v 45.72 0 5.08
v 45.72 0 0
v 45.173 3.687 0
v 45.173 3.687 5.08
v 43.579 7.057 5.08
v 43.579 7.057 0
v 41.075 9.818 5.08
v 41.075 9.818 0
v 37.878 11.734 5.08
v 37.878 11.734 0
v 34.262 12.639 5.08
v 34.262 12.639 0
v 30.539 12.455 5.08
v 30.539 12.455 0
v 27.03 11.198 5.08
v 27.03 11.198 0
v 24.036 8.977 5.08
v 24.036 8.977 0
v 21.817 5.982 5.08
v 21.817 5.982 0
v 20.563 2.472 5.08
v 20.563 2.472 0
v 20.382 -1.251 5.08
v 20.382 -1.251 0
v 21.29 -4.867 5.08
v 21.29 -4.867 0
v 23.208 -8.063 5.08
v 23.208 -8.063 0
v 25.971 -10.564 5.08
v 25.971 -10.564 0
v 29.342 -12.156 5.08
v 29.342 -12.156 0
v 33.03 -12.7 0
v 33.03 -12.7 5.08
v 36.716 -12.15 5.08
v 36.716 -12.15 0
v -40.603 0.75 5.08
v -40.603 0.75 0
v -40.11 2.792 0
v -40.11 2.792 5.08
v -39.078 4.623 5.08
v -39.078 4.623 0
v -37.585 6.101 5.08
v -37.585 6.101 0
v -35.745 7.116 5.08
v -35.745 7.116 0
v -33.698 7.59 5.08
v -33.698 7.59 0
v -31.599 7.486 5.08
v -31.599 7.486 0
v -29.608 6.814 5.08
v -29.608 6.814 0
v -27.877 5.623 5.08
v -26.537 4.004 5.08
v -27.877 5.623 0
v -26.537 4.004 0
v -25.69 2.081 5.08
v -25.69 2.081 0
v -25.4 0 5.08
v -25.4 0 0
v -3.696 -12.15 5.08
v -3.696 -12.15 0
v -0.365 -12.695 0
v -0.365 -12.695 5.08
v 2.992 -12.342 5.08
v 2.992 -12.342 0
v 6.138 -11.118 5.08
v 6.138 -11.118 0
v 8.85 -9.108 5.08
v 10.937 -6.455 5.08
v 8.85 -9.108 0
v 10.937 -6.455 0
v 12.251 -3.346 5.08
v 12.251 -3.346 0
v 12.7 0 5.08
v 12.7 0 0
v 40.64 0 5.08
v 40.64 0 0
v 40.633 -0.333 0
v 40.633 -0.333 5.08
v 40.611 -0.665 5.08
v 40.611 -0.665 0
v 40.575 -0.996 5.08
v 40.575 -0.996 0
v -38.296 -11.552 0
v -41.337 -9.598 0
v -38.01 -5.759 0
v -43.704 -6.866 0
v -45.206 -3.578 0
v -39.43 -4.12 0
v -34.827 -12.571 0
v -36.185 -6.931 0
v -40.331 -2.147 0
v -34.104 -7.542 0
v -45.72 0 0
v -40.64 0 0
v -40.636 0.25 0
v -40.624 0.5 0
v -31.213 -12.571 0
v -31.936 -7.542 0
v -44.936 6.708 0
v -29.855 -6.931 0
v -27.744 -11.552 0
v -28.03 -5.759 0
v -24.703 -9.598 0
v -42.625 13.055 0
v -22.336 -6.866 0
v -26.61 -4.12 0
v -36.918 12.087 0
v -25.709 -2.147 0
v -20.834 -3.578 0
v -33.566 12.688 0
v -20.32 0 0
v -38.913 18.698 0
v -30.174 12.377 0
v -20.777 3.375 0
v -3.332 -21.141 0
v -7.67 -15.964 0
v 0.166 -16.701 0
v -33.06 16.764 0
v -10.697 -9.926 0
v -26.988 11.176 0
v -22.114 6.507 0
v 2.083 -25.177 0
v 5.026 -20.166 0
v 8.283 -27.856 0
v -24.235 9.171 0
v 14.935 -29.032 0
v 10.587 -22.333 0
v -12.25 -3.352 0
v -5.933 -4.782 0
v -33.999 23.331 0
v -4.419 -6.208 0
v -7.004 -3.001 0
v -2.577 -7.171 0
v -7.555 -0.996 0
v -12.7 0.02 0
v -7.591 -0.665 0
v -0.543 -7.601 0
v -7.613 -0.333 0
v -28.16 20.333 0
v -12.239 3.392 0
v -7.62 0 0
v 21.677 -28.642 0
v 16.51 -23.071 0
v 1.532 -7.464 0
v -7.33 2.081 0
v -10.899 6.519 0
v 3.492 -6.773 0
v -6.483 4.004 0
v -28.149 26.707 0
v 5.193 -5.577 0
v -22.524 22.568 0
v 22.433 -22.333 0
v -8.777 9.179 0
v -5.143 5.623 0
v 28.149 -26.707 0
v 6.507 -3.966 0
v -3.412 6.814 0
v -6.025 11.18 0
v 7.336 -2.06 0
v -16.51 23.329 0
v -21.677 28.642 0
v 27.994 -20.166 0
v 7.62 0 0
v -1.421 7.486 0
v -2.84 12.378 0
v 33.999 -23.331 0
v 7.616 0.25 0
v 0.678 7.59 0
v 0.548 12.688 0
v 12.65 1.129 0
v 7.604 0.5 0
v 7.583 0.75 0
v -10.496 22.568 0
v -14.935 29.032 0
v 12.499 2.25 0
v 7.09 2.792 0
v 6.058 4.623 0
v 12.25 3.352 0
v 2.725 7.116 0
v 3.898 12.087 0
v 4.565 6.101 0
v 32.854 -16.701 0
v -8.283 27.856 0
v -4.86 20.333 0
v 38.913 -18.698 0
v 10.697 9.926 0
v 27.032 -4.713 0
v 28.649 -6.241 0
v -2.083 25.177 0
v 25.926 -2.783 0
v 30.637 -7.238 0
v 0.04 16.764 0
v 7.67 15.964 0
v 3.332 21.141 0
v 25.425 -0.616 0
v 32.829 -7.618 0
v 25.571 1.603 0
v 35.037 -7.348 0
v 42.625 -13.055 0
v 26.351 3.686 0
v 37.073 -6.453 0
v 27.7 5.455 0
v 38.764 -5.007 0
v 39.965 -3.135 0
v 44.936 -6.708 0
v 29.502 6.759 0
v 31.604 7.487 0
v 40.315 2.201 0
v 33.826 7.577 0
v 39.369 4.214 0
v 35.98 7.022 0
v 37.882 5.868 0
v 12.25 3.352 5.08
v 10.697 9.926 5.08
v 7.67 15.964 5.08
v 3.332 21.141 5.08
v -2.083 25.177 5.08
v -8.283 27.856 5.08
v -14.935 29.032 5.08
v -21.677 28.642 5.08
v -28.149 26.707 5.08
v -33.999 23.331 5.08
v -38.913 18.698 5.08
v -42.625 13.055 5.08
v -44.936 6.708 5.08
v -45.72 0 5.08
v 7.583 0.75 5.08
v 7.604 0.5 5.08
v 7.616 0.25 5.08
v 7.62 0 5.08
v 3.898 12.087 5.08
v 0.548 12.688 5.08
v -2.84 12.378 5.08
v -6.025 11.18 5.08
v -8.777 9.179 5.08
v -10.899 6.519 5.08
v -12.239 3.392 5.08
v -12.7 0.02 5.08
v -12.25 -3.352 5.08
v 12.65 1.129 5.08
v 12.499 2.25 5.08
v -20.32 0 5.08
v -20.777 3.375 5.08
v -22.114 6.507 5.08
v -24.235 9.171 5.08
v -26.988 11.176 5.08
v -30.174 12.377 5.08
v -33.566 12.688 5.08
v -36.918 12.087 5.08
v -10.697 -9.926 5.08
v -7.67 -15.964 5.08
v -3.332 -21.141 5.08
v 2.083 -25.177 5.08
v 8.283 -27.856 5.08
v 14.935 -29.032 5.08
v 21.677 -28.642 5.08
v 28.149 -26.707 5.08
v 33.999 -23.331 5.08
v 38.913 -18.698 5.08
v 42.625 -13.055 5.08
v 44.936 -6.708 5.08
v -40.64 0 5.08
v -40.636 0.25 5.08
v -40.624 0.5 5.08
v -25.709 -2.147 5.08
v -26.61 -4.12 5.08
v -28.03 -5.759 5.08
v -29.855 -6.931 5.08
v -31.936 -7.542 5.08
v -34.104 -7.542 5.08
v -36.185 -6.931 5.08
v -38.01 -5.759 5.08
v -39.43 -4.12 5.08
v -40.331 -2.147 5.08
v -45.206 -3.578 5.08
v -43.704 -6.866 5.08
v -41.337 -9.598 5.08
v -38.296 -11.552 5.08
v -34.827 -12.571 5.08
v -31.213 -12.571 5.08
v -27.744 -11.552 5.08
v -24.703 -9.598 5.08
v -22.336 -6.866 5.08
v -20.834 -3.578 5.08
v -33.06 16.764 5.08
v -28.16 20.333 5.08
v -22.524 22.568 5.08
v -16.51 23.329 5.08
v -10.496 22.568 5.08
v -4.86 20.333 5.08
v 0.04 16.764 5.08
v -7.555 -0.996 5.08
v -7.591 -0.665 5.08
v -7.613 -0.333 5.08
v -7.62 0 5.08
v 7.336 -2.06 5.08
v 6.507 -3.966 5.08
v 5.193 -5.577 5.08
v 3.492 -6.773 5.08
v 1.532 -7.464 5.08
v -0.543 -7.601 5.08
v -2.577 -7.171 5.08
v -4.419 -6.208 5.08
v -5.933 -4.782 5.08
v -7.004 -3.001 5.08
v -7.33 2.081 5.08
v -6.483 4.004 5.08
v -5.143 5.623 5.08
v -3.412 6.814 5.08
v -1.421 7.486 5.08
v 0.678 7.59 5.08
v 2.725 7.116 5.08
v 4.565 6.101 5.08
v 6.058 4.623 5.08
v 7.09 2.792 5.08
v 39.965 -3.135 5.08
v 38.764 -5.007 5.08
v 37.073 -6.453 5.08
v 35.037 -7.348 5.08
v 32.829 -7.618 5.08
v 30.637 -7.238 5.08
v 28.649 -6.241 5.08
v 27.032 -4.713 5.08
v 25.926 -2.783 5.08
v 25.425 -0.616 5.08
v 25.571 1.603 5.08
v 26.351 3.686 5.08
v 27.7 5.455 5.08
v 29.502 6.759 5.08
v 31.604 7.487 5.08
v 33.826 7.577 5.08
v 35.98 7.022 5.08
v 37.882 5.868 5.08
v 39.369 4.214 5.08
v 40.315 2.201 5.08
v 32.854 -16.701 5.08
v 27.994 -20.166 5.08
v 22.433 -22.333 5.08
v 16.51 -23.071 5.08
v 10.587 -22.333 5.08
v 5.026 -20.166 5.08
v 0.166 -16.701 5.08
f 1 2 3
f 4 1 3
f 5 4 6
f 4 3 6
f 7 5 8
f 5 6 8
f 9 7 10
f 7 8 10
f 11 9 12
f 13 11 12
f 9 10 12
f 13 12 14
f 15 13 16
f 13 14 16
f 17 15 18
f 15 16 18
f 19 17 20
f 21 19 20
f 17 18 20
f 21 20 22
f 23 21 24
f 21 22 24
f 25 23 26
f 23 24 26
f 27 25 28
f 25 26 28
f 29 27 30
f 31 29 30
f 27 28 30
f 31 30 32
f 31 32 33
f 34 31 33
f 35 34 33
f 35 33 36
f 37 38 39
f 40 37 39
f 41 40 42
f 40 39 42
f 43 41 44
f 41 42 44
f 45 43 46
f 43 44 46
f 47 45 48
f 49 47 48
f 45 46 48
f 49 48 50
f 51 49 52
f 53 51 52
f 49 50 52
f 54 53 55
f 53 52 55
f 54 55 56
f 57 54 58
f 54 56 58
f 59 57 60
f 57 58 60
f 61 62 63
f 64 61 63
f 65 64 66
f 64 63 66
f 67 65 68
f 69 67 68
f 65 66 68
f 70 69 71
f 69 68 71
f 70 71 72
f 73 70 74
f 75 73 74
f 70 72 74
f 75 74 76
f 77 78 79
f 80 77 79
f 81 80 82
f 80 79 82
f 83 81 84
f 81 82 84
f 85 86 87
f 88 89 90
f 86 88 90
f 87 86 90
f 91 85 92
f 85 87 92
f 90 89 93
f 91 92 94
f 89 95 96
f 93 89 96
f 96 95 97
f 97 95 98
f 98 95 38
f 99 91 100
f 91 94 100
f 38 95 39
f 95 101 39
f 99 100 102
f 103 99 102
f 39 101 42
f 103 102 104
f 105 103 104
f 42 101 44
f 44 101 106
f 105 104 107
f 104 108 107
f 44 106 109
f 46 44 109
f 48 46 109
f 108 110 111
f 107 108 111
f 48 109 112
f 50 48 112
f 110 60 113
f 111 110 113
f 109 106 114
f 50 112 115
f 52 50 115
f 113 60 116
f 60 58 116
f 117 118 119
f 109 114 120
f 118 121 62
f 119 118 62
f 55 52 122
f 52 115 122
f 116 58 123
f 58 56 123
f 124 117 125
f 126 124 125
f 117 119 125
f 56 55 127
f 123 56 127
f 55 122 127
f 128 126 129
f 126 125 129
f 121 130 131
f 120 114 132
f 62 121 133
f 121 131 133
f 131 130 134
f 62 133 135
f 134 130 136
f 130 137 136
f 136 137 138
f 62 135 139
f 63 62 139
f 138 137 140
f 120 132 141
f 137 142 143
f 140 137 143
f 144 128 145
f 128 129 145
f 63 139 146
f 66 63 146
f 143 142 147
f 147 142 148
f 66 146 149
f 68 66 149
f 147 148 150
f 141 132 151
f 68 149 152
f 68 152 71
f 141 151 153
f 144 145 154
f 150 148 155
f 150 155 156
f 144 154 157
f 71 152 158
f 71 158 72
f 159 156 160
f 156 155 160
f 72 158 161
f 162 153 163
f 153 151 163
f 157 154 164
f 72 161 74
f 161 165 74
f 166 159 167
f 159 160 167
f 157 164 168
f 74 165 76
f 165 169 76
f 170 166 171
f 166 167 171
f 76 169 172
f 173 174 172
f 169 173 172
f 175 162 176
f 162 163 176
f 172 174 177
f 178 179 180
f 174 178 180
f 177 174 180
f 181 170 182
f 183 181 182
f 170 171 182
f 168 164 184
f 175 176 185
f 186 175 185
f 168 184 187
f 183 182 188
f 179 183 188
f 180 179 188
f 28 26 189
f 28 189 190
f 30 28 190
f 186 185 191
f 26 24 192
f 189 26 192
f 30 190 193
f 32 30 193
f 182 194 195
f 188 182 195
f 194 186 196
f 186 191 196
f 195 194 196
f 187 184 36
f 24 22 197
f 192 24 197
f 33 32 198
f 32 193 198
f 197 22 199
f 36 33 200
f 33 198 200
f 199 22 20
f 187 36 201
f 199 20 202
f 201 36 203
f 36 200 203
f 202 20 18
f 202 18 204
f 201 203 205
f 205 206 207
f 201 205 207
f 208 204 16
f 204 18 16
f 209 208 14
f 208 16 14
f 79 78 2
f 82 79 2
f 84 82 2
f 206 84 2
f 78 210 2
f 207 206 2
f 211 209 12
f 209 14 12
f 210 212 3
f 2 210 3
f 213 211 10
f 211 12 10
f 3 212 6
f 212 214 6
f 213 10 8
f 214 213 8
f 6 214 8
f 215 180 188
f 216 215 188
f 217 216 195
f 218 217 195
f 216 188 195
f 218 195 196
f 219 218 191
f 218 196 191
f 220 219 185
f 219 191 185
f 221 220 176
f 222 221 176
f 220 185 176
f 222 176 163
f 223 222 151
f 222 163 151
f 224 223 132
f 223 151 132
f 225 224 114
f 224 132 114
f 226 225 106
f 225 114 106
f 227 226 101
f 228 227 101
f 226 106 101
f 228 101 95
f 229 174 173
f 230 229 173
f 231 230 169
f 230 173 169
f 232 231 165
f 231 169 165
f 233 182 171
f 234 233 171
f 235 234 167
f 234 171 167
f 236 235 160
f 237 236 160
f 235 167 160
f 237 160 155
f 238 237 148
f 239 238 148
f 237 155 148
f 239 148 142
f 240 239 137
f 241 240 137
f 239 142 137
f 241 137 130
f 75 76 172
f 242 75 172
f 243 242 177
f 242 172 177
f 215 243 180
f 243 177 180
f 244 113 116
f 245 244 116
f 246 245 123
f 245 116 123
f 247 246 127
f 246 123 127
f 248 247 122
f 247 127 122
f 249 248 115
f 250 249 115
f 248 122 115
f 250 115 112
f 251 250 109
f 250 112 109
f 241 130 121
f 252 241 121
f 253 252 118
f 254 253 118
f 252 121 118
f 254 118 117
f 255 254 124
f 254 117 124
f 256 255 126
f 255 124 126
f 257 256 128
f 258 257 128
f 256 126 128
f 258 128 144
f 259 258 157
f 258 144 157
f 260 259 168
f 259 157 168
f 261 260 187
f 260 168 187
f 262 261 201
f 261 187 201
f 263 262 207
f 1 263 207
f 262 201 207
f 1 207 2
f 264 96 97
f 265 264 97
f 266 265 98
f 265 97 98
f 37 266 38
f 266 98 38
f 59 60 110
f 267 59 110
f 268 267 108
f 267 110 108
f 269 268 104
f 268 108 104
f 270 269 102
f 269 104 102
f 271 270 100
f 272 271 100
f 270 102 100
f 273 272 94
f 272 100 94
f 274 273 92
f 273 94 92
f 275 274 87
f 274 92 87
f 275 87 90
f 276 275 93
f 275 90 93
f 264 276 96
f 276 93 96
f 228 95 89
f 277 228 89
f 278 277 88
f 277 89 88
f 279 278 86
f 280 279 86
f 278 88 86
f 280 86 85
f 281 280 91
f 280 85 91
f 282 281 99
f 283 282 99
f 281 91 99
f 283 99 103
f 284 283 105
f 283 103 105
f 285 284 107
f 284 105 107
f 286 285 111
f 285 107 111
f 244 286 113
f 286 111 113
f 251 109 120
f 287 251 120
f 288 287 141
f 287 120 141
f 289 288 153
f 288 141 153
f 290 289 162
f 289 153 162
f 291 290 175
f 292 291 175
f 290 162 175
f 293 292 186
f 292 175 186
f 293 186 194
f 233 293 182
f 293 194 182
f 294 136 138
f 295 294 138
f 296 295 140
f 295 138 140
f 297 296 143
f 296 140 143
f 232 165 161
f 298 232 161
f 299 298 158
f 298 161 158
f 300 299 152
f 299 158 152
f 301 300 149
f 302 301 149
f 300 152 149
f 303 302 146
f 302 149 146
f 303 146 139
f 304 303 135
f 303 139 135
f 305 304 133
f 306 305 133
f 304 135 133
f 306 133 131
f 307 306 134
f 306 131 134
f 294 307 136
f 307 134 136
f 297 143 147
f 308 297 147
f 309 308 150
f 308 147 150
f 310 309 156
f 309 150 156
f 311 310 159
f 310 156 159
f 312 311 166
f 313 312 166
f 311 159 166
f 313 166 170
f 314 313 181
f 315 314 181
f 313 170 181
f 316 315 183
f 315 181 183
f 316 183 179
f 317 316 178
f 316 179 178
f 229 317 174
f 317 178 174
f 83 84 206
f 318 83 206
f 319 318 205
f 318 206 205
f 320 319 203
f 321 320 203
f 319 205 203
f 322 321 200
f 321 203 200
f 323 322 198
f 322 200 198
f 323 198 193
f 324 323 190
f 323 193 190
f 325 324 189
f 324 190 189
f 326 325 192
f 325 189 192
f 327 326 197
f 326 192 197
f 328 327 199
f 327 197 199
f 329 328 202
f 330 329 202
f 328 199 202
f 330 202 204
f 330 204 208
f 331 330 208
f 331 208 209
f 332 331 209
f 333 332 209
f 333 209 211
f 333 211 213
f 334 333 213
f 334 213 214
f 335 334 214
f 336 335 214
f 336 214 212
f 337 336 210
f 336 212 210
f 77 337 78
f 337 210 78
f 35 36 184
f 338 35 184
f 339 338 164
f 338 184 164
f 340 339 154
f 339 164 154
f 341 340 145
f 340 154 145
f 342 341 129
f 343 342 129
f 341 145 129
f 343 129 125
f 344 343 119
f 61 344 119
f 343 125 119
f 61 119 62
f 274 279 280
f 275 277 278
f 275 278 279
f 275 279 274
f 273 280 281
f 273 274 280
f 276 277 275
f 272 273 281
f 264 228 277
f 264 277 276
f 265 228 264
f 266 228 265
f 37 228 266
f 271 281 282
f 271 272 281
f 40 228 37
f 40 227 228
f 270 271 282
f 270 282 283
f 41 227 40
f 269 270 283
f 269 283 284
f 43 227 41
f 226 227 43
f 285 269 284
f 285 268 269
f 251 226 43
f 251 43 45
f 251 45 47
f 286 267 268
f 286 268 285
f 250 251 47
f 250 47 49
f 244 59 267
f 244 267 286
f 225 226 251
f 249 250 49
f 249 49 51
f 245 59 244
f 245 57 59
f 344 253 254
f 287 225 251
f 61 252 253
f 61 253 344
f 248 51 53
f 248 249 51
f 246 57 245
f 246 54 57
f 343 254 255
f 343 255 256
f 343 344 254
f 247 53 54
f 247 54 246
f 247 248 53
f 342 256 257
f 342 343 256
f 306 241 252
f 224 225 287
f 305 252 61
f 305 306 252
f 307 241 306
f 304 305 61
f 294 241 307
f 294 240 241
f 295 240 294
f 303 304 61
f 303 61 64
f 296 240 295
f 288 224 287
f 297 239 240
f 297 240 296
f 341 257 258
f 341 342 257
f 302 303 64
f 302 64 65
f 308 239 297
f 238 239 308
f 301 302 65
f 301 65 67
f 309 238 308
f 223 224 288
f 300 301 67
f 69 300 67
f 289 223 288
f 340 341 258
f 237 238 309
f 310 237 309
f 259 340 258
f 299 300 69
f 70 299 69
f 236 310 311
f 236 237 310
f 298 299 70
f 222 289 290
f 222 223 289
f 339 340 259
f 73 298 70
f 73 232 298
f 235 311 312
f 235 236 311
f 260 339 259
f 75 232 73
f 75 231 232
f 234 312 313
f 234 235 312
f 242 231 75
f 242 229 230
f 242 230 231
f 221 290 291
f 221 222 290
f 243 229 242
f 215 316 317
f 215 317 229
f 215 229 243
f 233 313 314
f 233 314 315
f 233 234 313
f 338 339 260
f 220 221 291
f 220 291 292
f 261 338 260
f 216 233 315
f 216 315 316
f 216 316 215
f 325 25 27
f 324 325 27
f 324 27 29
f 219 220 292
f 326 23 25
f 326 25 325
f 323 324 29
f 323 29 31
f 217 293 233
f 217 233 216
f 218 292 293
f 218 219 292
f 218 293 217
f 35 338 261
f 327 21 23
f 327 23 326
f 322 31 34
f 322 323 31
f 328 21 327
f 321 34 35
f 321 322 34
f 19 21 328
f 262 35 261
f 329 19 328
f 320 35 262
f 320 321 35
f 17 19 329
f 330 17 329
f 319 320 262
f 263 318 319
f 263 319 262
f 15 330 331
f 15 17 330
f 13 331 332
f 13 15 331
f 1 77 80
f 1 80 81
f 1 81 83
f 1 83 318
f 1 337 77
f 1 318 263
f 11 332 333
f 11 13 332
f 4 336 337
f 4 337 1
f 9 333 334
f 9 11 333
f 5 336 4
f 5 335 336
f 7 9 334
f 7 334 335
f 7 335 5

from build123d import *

# Parameters (mm, degrees)
F1_DEPTH = 5.08


# Not quite as in the source:
# - a feature names something its author has since deleted; it is built from what else it names


with BuildPart() as f1:
    # F0 (on Top) → F1 (new body)
    with BuildSketch(Plane.XY):
        with BuildLine():
            ThreePointArc((7.5830097901, 0.7499083436), (7.6107468293, 0.3754100423), (7.62, 0))
            ThreePointArc((7.62, 0), (0.4990141385, -7.6036428697), (-7.5546417033, -0.9958859045))
            ThreePointArc((-7.5546417033, -0.9958859045), (-6.3173271202, -6.8123022238), (-3.6964522326, -12.1501539452))
            ThreePointArc((-3.6964522326, -12.1501539452), (7.5612517696, -10.2037969245), (12.7, 0))
            ThreePointArc((12.7, 0), (12.5868786701, 1.6912969415), (12.249529867, 3.3524644721))
            ThreePointArc((12.249529867, 3.3524644721), (9.1791212991, 8.776886246), (3.897633179, 12.0871194088))
            ThreePointArc((3.897633179, 12.0871194088), (6.451051693, 6.6495502812), (7.5830097901, 0.7499083436))
        make_face()
        with BuildLine():
            ThreePointArc((-36.917633179, 12.0871194088), (-16.51, 23.3293611901), (3.897633179, 12.0871194088))
            ThreePointArc((3.897633179, 12.0871194088), (9.1791212991, 8.776886246), (12.249529867, 3.3524644721))
            ThreePointArc((12.249529867, 3.3524644721), (-18.3173290135, 29.0331939814), (-45.72, 0))
            ThreePointArc((-45.72, 0), (-43.286205272, 7.4762978347), (-36.917633179, 12.0871194088))
        make_face()
        with BuildLine():
            ThreePointArc((-20.32, 0), (-25.5437021653, 10.266205272), (-36.917633179, 12.0871194088))
            ThreePointArc((-36.917633179, 12.0871194088), (-43.286205272, 7.4762978347), (-45.72, 0))
            ThreePointArc((-45.72, 0), (-33.02, -12.7), (-20.32, 0))
        make_face()
        with BuildLine():
            ThreePointArc((-40.64, 0), (-40.6307468293, 0.3754100423), (-40.6030097901, 0.7499083436))
            ThreePointArc((-40.6030097901, 0.7499083436), (-32.6445899577, 7.6107468293), (-25.4, 0))
            ThreePointArc((-25.4, 0), (-33.02, -7.62), (-40.64, 0))
        make_face(mode=Mode.SUBTRACT)
        with BuildLine():
            ThreePointArc((36.7164522326, -12.1501539452), (16.51, -23.0707915841), (-3.6964522326, -12.1501539452))
            ThreePointArc((-3.6964522326, -12.1501539452), (-9.1059552655, -8.8527723739), (-12.249529867, -3.3524644721))
            ThreePointArc((-12.249529867, -3.3524644721), (18.3173290135, -29.0331939814), (45.72, 0))
            ThreePointArc((45.72, 0), (43.2237969245, -7.5612517696), (36.7164522326, -12.1501539452))
        make_face()
        with BuildLine():
            ThreePointArc((45.72, 0), (22.8162030755, 7.5612517696), (36.7164522326, -12.1501539452))
            ThreePointArc((36.7164522326, -12.1501539452), (43.2237969245, -7.5612517696), (45.72, 0))
        make_face()
        with BuildLine():
            ThreePointArc((40.64, 0), (40.6236428697, -0.4990141385), (40.5746417033, -0.9958859045))
            ThreePointArc((40.5746417033, -0.9958859045), (25.4163571303, 0.4990141385), (40.64, 0))
        make_face(mode=Mode.SUBTRACT)
        with BuildLine():
            ThreePointArc((-7.62, 0), (-0.3754100423, 7.6107468293), (7.5830097901, 0.7499083436))
            ThreePointArc((7.5830097901, 0.7499083436), (6.451051693, 6.6495502812), (3.897633179, 12.0871194088))
            ThreePointArc((3.897633179, 12.0871194088), (-8.776886246, 9.1791212991), (-12.249529867, -3.3524644721))
            ThreePointArc((-12.249529867, -3.3524644721), (-9.1059552655, -8.8527723739), (-3.6964522326, -12.1501539452))
            ThreePointArc((-3.6964522326, -12.1501539452), (-6.3173271202, -6.8123022238), (-7.5546417033, -0.9958859045))
            ThreePointArc((-7.5546417033, -0.9958859045), (-7.6036428697, -0.4990141385), (-7.62, 0))
        make_face()
    extrude(amount=F1_DEPTH)


solid = f1.part
